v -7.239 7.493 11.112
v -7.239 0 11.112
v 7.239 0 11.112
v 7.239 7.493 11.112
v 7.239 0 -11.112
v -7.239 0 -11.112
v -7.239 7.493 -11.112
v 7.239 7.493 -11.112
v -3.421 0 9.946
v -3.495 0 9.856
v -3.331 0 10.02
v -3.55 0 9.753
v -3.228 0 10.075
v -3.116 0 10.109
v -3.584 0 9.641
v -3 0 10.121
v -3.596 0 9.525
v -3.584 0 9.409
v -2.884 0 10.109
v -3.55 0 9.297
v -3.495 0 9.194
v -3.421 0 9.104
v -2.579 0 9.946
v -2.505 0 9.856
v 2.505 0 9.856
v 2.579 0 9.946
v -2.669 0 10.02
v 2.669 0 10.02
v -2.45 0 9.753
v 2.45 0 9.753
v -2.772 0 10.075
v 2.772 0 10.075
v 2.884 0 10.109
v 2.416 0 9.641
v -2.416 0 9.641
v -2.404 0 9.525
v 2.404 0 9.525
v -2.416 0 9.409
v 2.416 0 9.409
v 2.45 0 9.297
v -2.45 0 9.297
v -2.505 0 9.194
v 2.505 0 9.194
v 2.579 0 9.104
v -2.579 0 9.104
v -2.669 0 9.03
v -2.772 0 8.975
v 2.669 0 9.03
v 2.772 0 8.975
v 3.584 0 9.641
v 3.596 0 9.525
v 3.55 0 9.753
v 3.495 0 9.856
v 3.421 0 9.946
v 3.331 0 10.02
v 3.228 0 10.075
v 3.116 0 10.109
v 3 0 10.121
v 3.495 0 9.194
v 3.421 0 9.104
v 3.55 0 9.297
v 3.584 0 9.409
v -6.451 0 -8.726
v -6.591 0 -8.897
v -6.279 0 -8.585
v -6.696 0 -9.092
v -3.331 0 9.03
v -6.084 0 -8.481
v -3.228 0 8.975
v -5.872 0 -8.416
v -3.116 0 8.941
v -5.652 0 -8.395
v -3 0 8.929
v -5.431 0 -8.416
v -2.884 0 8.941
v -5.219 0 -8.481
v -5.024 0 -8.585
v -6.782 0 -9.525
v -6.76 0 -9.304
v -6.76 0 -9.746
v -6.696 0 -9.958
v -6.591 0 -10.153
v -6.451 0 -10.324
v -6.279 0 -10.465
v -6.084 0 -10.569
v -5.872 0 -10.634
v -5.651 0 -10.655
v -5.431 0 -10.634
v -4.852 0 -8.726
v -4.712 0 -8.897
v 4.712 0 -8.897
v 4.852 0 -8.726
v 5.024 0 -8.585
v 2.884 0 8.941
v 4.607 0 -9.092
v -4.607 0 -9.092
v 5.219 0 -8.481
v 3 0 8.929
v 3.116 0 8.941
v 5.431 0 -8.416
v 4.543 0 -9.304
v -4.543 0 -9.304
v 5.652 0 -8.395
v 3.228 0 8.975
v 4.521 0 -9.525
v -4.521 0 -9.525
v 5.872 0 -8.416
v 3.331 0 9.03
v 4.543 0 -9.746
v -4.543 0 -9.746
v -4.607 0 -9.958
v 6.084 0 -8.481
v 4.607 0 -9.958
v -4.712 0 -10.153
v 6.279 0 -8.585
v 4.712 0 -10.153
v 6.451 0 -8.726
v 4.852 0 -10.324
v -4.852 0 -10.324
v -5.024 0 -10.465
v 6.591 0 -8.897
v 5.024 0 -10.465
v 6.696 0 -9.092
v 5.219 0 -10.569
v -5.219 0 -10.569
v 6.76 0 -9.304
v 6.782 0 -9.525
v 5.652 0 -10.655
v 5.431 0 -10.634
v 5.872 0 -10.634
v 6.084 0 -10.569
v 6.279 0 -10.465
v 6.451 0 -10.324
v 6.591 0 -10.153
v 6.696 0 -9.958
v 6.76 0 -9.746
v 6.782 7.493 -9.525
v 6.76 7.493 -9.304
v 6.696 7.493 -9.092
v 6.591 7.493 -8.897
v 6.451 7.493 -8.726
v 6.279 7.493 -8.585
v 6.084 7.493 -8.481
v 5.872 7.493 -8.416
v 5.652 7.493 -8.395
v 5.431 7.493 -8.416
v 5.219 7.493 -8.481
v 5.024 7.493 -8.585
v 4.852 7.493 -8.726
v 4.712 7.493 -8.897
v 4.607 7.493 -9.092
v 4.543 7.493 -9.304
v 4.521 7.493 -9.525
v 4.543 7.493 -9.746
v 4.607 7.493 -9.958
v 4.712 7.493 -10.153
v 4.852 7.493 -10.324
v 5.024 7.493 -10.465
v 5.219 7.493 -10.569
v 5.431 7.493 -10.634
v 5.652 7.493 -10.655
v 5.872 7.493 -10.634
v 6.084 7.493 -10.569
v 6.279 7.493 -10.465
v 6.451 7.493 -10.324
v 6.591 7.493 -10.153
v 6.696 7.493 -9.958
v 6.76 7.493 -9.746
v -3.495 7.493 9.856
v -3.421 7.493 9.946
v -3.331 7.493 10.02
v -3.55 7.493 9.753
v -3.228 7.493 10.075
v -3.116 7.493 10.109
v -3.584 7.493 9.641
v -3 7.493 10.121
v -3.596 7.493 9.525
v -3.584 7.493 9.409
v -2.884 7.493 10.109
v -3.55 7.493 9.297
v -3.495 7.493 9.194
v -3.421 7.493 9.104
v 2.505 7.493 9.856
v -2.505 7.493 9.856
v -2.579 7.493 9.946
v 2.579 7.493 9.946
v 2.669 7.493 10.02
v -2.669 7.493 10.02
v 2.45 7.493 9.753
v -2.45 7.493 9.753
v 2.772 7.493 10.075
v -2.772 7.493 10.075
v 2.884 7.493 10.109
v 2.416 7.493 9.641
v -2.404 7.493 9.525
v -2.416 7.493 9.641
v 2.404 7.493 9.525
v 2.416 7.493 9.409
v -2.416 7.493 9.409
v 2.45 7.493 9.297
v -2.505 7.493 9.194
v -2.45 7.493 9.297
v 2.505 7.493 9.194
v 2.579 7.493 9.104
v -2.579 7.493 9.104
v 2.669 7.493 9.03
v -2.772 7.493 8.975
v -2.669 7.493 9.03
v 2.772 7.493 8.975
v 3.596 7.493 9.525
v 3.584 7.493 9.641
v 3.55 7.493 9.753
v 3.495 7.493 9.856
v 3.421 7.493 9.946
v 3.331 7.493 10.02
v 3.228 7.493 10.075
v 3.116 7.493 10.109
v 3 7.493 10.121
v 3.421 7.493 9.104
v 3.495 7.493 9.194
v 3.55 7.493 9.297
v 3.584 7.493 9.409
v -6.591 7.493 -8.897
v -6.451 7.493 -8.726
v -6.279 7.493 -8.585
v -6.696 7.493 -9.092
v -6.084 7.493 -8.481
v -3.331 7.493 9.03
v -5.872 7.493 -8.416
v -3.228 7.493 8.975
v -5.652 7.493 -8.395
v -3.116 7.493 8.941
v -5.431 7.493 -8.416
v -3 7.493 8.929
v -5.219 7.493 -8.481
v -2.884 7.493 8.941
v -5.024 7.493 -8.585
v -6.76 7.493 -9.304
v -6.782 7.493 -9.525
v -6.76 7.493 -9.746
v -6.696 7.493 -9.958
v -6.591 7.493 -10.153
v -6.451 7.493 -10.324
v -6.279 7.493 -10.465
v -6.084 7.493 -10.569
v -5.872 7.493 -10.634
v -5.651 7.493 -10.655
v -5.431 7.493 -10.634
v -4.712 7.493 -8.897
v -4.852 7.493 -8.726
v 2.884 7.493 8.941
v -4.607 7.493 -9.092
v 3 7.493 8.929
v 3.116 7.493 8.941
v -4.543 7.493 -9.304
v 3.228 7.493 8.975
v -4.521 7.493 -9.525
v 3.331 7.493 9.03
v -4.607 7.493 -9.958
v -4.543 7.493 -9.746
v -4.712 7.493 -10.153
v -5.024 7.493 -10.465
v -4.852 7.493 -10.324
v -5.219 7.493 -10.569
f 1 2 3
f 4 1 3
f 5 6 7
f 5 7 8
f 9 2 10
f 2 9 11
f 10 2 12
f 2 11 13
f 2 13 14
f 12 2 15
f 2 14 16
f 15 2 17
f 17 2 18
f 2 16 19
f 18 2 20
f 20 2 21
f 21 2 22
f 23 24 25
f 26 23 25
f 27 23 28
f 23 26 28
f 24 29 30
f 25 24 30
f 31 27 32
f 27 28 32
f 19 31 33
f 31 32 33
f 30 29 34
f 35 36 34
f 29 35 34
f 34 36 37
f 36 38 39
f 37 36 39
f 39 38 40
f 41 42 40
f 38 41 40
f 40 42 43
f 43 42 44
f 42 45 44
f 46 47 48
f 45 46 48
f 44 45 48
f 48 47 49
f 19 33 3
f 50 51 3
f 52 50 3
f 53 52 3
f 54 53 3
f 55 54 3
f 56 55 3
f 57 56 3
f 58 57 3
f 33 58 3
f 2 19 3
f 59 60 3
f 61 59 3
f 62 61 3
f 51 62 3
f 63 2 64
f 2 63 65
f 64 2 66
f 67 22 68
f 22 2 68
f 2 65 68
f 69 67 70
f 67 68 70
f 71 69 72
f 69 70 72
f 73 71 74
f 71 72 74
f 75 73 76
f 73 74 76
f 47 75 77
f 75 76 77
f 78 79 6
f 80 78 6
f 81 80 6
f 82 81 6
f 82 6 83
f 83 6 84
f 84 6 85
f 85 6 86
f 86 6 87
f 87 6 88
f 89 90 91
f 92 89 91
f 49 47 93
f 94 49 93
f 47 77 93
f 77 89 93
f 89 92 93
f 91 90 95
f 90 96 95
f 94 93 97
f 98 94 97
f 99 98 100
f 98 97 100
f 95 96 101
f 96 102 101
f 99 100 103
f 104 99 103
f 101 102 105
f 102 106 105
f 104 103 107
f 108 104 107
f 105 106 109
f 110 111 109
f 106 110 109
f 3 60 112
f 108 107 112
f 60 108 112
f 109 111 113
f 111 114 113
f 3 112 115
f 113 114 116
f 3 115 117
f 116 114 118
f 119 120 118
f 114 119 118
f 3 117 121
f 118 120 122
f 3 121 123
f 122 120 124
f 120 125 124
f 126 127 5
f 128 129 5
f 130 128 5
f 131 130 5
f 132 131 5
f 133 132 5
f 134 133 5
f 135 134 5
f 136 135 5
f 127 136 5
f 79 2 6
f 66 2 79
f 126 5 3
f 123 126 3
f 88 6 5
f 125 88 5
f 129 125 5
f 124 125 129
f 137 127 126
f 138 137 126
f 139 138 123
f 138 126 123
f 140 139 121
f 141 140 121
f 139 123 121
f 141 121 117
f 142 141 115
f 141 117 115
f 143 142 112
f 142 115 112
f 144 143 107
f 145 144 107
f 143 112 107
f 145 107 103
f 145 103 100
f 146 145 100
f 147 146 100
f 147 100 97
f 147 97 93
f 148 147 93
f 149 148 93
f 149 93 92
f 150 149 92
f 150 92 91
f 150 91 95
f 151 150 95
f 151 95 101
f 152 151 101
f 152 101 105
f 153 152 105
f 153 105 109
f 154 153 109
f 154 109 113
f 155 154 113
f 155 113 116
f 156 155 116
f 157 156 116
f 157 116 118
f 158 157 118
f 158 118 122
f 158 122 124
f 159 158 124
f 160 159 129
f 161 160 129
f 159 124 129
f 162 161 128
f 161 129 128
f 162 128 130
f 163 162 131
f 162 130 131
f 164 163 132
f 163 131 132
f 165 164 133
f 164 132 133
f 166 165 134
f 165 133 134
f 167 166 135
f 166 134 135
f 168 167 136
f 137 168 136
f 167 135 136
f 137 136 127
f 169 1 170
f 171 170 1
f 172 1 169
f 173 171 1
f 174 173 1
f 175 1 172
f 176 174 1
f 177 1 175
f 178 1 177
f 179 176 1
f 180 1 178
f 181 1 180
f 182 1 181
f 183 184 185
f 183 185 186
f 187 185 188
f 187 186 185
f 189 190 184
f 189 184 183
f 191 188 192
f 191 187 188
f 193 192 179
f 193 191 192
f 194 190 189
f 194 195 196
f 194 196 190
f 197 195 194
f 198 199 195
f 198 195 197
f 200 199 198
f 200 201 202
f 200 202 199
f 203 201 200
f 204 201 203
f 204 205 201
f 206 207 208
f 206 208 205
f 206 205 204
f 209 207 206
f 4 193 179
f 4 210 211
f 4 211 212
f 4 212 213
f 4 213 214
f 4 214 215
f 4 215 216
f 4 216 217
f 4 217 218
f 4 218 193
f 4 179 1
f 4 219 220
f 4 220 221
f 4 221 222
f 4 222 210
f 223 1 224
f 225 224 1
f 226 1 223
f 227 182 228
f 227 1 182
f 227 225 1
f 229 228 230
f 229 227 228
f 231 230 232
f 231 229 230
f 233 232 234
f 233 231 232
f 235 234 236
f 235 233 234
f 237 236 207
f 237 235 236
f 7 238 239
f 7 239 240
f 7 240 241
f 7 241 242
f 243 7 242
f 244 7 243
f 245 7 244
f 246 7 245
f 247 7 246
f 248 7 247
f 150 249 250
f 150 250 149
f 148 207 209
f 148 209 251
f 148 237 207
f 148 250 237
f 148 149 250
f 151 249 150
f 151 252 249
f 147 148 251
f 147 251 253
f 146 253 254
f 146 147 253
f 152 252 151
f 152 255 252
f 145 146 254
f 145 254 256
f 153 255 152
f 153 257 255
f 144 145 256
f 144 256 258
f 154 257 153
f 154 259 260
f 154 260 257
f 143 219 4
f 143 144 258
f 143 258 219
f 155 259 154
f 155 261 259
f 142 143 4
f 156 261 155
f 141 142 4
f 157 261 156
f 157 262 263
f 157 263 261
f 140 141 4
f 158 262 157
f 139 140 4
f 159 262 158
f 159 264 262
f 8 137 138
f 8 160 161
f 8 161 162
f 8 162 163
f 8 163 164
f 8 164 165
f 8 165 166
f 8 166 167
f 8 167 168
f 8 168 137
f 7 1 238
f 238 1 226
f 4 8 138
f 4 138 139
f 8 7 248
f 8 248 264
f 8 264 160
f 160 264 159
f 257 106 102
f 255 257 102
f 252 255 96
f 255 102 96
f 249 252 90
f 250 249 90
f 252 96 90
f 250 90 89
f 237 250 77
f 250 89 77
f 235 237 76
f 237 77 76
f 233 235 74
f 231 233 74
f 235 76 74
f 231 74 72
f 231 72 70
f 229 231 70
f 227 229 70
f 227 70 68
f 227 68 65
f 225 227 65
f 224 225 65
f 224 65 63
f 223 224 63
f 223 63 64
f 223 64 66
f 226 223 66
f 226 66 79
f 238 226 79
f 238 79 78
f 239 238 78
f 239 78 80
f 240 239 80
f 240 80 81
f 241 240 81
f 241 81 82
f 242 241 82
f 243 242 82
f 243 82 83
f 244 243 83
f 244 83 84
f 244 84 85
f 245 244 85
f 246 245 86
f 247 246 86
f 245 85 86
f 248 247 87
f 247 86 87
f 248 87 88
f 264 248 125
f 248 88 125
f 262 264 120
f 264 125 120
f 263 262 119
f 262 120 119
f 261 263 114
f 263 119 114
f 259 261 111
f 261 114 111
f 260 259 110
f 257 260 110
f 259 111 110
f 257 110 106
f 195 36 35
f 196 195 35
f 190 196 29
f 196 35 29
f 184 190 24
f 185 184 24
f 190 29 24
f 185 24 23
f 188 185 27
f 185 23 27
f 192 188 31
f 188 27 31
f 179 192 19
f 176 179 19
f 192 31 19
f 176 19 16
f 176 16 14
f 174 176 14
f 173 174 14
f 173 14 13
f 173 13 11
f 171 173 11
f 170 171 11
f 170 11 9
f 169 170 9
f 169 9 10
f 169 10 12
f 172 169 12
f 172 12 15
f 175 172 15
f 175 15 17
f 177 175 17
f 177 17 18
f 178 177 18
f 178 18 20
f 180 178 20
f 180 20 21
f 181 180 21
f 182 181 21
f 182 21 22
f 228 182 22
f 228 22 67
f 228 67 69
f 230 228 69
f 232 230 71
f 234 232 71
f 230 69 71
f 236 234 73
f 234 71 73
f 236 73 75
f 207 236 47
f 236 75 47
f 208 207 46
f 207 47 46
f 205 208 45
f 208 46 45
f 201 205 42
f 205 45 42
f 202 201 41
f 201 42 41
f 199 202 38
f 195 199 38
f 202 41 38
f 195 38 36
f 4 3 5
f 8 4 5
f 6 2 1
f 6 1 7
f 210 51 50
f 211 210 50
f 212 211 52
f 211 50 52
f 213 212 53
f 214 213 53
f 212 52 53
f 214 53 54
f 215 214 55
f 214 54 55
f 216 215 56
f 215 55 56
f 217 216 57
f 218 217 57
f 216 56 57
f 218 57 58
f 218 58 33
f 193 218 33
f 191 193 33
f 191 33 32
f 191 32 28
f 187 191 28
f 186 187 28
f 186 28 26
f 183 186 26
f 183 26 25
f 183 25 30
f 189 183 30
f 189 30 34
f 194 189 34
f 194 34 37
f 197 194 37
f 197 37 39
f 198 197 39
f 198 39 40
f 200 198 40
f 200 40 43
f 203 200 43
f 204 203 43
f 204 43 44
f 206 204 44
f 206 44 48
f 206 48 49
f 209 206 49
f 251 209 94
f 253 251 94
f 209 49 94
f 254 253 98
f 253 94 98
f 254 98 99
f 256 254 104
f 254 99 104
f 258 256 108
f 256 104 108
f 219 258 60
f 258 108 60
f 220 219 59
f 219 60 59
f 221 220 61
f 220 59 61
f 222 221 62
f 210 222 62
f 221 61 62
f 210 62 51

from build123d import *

# Parameters (mm, degrees)
SKETCH1_W             = 14.478
SKETCH1_H             = 22.225
BOSS_EXTRUDE1_DEPTH   = 7.493
F_0_80_TAPPED_HOLE1_D = 1.19126
F_2_CLEARANCE_HOLE1_D = 2.2606


with BuildPart() as part:
    # Sketch1 → Boss-Extrude1 (new body)
    with BuildSketch(Plane(origin=(0, 0, 0), x_dir=(1, 0, 0), z_dir=(0, 1, 0))):
        Rectangle(SKETCH1_W, SKETCH1_H)
    extrude(amount=BOSS_EXTRUDE1_DEPTH)

    # #0-80 Tapped Hole1 (through all)
    with Locations(Plane(origin=(0, 7.493, 0), x_dir=(-1, 0, 0), z_dir=(0, 1, 0))):
        with Locations((3, 9.525), (-3, 9.525)):
            Hole(F_0_80_TAPPED_HOLE1_D / 2)

    # #2 Clearance Hole1 (through all)
    with Locations(Plane(origin=(0, 7.493, 0), x_dir=(-1, 0, 0), z_dir=(0, 1, 0))):
        with Locations((5.6515, -9.525), (-5.6515, -9.525)):
            Hole(F_2_CLEARANCE_HOLE1_D / 2)


solid = part.part
